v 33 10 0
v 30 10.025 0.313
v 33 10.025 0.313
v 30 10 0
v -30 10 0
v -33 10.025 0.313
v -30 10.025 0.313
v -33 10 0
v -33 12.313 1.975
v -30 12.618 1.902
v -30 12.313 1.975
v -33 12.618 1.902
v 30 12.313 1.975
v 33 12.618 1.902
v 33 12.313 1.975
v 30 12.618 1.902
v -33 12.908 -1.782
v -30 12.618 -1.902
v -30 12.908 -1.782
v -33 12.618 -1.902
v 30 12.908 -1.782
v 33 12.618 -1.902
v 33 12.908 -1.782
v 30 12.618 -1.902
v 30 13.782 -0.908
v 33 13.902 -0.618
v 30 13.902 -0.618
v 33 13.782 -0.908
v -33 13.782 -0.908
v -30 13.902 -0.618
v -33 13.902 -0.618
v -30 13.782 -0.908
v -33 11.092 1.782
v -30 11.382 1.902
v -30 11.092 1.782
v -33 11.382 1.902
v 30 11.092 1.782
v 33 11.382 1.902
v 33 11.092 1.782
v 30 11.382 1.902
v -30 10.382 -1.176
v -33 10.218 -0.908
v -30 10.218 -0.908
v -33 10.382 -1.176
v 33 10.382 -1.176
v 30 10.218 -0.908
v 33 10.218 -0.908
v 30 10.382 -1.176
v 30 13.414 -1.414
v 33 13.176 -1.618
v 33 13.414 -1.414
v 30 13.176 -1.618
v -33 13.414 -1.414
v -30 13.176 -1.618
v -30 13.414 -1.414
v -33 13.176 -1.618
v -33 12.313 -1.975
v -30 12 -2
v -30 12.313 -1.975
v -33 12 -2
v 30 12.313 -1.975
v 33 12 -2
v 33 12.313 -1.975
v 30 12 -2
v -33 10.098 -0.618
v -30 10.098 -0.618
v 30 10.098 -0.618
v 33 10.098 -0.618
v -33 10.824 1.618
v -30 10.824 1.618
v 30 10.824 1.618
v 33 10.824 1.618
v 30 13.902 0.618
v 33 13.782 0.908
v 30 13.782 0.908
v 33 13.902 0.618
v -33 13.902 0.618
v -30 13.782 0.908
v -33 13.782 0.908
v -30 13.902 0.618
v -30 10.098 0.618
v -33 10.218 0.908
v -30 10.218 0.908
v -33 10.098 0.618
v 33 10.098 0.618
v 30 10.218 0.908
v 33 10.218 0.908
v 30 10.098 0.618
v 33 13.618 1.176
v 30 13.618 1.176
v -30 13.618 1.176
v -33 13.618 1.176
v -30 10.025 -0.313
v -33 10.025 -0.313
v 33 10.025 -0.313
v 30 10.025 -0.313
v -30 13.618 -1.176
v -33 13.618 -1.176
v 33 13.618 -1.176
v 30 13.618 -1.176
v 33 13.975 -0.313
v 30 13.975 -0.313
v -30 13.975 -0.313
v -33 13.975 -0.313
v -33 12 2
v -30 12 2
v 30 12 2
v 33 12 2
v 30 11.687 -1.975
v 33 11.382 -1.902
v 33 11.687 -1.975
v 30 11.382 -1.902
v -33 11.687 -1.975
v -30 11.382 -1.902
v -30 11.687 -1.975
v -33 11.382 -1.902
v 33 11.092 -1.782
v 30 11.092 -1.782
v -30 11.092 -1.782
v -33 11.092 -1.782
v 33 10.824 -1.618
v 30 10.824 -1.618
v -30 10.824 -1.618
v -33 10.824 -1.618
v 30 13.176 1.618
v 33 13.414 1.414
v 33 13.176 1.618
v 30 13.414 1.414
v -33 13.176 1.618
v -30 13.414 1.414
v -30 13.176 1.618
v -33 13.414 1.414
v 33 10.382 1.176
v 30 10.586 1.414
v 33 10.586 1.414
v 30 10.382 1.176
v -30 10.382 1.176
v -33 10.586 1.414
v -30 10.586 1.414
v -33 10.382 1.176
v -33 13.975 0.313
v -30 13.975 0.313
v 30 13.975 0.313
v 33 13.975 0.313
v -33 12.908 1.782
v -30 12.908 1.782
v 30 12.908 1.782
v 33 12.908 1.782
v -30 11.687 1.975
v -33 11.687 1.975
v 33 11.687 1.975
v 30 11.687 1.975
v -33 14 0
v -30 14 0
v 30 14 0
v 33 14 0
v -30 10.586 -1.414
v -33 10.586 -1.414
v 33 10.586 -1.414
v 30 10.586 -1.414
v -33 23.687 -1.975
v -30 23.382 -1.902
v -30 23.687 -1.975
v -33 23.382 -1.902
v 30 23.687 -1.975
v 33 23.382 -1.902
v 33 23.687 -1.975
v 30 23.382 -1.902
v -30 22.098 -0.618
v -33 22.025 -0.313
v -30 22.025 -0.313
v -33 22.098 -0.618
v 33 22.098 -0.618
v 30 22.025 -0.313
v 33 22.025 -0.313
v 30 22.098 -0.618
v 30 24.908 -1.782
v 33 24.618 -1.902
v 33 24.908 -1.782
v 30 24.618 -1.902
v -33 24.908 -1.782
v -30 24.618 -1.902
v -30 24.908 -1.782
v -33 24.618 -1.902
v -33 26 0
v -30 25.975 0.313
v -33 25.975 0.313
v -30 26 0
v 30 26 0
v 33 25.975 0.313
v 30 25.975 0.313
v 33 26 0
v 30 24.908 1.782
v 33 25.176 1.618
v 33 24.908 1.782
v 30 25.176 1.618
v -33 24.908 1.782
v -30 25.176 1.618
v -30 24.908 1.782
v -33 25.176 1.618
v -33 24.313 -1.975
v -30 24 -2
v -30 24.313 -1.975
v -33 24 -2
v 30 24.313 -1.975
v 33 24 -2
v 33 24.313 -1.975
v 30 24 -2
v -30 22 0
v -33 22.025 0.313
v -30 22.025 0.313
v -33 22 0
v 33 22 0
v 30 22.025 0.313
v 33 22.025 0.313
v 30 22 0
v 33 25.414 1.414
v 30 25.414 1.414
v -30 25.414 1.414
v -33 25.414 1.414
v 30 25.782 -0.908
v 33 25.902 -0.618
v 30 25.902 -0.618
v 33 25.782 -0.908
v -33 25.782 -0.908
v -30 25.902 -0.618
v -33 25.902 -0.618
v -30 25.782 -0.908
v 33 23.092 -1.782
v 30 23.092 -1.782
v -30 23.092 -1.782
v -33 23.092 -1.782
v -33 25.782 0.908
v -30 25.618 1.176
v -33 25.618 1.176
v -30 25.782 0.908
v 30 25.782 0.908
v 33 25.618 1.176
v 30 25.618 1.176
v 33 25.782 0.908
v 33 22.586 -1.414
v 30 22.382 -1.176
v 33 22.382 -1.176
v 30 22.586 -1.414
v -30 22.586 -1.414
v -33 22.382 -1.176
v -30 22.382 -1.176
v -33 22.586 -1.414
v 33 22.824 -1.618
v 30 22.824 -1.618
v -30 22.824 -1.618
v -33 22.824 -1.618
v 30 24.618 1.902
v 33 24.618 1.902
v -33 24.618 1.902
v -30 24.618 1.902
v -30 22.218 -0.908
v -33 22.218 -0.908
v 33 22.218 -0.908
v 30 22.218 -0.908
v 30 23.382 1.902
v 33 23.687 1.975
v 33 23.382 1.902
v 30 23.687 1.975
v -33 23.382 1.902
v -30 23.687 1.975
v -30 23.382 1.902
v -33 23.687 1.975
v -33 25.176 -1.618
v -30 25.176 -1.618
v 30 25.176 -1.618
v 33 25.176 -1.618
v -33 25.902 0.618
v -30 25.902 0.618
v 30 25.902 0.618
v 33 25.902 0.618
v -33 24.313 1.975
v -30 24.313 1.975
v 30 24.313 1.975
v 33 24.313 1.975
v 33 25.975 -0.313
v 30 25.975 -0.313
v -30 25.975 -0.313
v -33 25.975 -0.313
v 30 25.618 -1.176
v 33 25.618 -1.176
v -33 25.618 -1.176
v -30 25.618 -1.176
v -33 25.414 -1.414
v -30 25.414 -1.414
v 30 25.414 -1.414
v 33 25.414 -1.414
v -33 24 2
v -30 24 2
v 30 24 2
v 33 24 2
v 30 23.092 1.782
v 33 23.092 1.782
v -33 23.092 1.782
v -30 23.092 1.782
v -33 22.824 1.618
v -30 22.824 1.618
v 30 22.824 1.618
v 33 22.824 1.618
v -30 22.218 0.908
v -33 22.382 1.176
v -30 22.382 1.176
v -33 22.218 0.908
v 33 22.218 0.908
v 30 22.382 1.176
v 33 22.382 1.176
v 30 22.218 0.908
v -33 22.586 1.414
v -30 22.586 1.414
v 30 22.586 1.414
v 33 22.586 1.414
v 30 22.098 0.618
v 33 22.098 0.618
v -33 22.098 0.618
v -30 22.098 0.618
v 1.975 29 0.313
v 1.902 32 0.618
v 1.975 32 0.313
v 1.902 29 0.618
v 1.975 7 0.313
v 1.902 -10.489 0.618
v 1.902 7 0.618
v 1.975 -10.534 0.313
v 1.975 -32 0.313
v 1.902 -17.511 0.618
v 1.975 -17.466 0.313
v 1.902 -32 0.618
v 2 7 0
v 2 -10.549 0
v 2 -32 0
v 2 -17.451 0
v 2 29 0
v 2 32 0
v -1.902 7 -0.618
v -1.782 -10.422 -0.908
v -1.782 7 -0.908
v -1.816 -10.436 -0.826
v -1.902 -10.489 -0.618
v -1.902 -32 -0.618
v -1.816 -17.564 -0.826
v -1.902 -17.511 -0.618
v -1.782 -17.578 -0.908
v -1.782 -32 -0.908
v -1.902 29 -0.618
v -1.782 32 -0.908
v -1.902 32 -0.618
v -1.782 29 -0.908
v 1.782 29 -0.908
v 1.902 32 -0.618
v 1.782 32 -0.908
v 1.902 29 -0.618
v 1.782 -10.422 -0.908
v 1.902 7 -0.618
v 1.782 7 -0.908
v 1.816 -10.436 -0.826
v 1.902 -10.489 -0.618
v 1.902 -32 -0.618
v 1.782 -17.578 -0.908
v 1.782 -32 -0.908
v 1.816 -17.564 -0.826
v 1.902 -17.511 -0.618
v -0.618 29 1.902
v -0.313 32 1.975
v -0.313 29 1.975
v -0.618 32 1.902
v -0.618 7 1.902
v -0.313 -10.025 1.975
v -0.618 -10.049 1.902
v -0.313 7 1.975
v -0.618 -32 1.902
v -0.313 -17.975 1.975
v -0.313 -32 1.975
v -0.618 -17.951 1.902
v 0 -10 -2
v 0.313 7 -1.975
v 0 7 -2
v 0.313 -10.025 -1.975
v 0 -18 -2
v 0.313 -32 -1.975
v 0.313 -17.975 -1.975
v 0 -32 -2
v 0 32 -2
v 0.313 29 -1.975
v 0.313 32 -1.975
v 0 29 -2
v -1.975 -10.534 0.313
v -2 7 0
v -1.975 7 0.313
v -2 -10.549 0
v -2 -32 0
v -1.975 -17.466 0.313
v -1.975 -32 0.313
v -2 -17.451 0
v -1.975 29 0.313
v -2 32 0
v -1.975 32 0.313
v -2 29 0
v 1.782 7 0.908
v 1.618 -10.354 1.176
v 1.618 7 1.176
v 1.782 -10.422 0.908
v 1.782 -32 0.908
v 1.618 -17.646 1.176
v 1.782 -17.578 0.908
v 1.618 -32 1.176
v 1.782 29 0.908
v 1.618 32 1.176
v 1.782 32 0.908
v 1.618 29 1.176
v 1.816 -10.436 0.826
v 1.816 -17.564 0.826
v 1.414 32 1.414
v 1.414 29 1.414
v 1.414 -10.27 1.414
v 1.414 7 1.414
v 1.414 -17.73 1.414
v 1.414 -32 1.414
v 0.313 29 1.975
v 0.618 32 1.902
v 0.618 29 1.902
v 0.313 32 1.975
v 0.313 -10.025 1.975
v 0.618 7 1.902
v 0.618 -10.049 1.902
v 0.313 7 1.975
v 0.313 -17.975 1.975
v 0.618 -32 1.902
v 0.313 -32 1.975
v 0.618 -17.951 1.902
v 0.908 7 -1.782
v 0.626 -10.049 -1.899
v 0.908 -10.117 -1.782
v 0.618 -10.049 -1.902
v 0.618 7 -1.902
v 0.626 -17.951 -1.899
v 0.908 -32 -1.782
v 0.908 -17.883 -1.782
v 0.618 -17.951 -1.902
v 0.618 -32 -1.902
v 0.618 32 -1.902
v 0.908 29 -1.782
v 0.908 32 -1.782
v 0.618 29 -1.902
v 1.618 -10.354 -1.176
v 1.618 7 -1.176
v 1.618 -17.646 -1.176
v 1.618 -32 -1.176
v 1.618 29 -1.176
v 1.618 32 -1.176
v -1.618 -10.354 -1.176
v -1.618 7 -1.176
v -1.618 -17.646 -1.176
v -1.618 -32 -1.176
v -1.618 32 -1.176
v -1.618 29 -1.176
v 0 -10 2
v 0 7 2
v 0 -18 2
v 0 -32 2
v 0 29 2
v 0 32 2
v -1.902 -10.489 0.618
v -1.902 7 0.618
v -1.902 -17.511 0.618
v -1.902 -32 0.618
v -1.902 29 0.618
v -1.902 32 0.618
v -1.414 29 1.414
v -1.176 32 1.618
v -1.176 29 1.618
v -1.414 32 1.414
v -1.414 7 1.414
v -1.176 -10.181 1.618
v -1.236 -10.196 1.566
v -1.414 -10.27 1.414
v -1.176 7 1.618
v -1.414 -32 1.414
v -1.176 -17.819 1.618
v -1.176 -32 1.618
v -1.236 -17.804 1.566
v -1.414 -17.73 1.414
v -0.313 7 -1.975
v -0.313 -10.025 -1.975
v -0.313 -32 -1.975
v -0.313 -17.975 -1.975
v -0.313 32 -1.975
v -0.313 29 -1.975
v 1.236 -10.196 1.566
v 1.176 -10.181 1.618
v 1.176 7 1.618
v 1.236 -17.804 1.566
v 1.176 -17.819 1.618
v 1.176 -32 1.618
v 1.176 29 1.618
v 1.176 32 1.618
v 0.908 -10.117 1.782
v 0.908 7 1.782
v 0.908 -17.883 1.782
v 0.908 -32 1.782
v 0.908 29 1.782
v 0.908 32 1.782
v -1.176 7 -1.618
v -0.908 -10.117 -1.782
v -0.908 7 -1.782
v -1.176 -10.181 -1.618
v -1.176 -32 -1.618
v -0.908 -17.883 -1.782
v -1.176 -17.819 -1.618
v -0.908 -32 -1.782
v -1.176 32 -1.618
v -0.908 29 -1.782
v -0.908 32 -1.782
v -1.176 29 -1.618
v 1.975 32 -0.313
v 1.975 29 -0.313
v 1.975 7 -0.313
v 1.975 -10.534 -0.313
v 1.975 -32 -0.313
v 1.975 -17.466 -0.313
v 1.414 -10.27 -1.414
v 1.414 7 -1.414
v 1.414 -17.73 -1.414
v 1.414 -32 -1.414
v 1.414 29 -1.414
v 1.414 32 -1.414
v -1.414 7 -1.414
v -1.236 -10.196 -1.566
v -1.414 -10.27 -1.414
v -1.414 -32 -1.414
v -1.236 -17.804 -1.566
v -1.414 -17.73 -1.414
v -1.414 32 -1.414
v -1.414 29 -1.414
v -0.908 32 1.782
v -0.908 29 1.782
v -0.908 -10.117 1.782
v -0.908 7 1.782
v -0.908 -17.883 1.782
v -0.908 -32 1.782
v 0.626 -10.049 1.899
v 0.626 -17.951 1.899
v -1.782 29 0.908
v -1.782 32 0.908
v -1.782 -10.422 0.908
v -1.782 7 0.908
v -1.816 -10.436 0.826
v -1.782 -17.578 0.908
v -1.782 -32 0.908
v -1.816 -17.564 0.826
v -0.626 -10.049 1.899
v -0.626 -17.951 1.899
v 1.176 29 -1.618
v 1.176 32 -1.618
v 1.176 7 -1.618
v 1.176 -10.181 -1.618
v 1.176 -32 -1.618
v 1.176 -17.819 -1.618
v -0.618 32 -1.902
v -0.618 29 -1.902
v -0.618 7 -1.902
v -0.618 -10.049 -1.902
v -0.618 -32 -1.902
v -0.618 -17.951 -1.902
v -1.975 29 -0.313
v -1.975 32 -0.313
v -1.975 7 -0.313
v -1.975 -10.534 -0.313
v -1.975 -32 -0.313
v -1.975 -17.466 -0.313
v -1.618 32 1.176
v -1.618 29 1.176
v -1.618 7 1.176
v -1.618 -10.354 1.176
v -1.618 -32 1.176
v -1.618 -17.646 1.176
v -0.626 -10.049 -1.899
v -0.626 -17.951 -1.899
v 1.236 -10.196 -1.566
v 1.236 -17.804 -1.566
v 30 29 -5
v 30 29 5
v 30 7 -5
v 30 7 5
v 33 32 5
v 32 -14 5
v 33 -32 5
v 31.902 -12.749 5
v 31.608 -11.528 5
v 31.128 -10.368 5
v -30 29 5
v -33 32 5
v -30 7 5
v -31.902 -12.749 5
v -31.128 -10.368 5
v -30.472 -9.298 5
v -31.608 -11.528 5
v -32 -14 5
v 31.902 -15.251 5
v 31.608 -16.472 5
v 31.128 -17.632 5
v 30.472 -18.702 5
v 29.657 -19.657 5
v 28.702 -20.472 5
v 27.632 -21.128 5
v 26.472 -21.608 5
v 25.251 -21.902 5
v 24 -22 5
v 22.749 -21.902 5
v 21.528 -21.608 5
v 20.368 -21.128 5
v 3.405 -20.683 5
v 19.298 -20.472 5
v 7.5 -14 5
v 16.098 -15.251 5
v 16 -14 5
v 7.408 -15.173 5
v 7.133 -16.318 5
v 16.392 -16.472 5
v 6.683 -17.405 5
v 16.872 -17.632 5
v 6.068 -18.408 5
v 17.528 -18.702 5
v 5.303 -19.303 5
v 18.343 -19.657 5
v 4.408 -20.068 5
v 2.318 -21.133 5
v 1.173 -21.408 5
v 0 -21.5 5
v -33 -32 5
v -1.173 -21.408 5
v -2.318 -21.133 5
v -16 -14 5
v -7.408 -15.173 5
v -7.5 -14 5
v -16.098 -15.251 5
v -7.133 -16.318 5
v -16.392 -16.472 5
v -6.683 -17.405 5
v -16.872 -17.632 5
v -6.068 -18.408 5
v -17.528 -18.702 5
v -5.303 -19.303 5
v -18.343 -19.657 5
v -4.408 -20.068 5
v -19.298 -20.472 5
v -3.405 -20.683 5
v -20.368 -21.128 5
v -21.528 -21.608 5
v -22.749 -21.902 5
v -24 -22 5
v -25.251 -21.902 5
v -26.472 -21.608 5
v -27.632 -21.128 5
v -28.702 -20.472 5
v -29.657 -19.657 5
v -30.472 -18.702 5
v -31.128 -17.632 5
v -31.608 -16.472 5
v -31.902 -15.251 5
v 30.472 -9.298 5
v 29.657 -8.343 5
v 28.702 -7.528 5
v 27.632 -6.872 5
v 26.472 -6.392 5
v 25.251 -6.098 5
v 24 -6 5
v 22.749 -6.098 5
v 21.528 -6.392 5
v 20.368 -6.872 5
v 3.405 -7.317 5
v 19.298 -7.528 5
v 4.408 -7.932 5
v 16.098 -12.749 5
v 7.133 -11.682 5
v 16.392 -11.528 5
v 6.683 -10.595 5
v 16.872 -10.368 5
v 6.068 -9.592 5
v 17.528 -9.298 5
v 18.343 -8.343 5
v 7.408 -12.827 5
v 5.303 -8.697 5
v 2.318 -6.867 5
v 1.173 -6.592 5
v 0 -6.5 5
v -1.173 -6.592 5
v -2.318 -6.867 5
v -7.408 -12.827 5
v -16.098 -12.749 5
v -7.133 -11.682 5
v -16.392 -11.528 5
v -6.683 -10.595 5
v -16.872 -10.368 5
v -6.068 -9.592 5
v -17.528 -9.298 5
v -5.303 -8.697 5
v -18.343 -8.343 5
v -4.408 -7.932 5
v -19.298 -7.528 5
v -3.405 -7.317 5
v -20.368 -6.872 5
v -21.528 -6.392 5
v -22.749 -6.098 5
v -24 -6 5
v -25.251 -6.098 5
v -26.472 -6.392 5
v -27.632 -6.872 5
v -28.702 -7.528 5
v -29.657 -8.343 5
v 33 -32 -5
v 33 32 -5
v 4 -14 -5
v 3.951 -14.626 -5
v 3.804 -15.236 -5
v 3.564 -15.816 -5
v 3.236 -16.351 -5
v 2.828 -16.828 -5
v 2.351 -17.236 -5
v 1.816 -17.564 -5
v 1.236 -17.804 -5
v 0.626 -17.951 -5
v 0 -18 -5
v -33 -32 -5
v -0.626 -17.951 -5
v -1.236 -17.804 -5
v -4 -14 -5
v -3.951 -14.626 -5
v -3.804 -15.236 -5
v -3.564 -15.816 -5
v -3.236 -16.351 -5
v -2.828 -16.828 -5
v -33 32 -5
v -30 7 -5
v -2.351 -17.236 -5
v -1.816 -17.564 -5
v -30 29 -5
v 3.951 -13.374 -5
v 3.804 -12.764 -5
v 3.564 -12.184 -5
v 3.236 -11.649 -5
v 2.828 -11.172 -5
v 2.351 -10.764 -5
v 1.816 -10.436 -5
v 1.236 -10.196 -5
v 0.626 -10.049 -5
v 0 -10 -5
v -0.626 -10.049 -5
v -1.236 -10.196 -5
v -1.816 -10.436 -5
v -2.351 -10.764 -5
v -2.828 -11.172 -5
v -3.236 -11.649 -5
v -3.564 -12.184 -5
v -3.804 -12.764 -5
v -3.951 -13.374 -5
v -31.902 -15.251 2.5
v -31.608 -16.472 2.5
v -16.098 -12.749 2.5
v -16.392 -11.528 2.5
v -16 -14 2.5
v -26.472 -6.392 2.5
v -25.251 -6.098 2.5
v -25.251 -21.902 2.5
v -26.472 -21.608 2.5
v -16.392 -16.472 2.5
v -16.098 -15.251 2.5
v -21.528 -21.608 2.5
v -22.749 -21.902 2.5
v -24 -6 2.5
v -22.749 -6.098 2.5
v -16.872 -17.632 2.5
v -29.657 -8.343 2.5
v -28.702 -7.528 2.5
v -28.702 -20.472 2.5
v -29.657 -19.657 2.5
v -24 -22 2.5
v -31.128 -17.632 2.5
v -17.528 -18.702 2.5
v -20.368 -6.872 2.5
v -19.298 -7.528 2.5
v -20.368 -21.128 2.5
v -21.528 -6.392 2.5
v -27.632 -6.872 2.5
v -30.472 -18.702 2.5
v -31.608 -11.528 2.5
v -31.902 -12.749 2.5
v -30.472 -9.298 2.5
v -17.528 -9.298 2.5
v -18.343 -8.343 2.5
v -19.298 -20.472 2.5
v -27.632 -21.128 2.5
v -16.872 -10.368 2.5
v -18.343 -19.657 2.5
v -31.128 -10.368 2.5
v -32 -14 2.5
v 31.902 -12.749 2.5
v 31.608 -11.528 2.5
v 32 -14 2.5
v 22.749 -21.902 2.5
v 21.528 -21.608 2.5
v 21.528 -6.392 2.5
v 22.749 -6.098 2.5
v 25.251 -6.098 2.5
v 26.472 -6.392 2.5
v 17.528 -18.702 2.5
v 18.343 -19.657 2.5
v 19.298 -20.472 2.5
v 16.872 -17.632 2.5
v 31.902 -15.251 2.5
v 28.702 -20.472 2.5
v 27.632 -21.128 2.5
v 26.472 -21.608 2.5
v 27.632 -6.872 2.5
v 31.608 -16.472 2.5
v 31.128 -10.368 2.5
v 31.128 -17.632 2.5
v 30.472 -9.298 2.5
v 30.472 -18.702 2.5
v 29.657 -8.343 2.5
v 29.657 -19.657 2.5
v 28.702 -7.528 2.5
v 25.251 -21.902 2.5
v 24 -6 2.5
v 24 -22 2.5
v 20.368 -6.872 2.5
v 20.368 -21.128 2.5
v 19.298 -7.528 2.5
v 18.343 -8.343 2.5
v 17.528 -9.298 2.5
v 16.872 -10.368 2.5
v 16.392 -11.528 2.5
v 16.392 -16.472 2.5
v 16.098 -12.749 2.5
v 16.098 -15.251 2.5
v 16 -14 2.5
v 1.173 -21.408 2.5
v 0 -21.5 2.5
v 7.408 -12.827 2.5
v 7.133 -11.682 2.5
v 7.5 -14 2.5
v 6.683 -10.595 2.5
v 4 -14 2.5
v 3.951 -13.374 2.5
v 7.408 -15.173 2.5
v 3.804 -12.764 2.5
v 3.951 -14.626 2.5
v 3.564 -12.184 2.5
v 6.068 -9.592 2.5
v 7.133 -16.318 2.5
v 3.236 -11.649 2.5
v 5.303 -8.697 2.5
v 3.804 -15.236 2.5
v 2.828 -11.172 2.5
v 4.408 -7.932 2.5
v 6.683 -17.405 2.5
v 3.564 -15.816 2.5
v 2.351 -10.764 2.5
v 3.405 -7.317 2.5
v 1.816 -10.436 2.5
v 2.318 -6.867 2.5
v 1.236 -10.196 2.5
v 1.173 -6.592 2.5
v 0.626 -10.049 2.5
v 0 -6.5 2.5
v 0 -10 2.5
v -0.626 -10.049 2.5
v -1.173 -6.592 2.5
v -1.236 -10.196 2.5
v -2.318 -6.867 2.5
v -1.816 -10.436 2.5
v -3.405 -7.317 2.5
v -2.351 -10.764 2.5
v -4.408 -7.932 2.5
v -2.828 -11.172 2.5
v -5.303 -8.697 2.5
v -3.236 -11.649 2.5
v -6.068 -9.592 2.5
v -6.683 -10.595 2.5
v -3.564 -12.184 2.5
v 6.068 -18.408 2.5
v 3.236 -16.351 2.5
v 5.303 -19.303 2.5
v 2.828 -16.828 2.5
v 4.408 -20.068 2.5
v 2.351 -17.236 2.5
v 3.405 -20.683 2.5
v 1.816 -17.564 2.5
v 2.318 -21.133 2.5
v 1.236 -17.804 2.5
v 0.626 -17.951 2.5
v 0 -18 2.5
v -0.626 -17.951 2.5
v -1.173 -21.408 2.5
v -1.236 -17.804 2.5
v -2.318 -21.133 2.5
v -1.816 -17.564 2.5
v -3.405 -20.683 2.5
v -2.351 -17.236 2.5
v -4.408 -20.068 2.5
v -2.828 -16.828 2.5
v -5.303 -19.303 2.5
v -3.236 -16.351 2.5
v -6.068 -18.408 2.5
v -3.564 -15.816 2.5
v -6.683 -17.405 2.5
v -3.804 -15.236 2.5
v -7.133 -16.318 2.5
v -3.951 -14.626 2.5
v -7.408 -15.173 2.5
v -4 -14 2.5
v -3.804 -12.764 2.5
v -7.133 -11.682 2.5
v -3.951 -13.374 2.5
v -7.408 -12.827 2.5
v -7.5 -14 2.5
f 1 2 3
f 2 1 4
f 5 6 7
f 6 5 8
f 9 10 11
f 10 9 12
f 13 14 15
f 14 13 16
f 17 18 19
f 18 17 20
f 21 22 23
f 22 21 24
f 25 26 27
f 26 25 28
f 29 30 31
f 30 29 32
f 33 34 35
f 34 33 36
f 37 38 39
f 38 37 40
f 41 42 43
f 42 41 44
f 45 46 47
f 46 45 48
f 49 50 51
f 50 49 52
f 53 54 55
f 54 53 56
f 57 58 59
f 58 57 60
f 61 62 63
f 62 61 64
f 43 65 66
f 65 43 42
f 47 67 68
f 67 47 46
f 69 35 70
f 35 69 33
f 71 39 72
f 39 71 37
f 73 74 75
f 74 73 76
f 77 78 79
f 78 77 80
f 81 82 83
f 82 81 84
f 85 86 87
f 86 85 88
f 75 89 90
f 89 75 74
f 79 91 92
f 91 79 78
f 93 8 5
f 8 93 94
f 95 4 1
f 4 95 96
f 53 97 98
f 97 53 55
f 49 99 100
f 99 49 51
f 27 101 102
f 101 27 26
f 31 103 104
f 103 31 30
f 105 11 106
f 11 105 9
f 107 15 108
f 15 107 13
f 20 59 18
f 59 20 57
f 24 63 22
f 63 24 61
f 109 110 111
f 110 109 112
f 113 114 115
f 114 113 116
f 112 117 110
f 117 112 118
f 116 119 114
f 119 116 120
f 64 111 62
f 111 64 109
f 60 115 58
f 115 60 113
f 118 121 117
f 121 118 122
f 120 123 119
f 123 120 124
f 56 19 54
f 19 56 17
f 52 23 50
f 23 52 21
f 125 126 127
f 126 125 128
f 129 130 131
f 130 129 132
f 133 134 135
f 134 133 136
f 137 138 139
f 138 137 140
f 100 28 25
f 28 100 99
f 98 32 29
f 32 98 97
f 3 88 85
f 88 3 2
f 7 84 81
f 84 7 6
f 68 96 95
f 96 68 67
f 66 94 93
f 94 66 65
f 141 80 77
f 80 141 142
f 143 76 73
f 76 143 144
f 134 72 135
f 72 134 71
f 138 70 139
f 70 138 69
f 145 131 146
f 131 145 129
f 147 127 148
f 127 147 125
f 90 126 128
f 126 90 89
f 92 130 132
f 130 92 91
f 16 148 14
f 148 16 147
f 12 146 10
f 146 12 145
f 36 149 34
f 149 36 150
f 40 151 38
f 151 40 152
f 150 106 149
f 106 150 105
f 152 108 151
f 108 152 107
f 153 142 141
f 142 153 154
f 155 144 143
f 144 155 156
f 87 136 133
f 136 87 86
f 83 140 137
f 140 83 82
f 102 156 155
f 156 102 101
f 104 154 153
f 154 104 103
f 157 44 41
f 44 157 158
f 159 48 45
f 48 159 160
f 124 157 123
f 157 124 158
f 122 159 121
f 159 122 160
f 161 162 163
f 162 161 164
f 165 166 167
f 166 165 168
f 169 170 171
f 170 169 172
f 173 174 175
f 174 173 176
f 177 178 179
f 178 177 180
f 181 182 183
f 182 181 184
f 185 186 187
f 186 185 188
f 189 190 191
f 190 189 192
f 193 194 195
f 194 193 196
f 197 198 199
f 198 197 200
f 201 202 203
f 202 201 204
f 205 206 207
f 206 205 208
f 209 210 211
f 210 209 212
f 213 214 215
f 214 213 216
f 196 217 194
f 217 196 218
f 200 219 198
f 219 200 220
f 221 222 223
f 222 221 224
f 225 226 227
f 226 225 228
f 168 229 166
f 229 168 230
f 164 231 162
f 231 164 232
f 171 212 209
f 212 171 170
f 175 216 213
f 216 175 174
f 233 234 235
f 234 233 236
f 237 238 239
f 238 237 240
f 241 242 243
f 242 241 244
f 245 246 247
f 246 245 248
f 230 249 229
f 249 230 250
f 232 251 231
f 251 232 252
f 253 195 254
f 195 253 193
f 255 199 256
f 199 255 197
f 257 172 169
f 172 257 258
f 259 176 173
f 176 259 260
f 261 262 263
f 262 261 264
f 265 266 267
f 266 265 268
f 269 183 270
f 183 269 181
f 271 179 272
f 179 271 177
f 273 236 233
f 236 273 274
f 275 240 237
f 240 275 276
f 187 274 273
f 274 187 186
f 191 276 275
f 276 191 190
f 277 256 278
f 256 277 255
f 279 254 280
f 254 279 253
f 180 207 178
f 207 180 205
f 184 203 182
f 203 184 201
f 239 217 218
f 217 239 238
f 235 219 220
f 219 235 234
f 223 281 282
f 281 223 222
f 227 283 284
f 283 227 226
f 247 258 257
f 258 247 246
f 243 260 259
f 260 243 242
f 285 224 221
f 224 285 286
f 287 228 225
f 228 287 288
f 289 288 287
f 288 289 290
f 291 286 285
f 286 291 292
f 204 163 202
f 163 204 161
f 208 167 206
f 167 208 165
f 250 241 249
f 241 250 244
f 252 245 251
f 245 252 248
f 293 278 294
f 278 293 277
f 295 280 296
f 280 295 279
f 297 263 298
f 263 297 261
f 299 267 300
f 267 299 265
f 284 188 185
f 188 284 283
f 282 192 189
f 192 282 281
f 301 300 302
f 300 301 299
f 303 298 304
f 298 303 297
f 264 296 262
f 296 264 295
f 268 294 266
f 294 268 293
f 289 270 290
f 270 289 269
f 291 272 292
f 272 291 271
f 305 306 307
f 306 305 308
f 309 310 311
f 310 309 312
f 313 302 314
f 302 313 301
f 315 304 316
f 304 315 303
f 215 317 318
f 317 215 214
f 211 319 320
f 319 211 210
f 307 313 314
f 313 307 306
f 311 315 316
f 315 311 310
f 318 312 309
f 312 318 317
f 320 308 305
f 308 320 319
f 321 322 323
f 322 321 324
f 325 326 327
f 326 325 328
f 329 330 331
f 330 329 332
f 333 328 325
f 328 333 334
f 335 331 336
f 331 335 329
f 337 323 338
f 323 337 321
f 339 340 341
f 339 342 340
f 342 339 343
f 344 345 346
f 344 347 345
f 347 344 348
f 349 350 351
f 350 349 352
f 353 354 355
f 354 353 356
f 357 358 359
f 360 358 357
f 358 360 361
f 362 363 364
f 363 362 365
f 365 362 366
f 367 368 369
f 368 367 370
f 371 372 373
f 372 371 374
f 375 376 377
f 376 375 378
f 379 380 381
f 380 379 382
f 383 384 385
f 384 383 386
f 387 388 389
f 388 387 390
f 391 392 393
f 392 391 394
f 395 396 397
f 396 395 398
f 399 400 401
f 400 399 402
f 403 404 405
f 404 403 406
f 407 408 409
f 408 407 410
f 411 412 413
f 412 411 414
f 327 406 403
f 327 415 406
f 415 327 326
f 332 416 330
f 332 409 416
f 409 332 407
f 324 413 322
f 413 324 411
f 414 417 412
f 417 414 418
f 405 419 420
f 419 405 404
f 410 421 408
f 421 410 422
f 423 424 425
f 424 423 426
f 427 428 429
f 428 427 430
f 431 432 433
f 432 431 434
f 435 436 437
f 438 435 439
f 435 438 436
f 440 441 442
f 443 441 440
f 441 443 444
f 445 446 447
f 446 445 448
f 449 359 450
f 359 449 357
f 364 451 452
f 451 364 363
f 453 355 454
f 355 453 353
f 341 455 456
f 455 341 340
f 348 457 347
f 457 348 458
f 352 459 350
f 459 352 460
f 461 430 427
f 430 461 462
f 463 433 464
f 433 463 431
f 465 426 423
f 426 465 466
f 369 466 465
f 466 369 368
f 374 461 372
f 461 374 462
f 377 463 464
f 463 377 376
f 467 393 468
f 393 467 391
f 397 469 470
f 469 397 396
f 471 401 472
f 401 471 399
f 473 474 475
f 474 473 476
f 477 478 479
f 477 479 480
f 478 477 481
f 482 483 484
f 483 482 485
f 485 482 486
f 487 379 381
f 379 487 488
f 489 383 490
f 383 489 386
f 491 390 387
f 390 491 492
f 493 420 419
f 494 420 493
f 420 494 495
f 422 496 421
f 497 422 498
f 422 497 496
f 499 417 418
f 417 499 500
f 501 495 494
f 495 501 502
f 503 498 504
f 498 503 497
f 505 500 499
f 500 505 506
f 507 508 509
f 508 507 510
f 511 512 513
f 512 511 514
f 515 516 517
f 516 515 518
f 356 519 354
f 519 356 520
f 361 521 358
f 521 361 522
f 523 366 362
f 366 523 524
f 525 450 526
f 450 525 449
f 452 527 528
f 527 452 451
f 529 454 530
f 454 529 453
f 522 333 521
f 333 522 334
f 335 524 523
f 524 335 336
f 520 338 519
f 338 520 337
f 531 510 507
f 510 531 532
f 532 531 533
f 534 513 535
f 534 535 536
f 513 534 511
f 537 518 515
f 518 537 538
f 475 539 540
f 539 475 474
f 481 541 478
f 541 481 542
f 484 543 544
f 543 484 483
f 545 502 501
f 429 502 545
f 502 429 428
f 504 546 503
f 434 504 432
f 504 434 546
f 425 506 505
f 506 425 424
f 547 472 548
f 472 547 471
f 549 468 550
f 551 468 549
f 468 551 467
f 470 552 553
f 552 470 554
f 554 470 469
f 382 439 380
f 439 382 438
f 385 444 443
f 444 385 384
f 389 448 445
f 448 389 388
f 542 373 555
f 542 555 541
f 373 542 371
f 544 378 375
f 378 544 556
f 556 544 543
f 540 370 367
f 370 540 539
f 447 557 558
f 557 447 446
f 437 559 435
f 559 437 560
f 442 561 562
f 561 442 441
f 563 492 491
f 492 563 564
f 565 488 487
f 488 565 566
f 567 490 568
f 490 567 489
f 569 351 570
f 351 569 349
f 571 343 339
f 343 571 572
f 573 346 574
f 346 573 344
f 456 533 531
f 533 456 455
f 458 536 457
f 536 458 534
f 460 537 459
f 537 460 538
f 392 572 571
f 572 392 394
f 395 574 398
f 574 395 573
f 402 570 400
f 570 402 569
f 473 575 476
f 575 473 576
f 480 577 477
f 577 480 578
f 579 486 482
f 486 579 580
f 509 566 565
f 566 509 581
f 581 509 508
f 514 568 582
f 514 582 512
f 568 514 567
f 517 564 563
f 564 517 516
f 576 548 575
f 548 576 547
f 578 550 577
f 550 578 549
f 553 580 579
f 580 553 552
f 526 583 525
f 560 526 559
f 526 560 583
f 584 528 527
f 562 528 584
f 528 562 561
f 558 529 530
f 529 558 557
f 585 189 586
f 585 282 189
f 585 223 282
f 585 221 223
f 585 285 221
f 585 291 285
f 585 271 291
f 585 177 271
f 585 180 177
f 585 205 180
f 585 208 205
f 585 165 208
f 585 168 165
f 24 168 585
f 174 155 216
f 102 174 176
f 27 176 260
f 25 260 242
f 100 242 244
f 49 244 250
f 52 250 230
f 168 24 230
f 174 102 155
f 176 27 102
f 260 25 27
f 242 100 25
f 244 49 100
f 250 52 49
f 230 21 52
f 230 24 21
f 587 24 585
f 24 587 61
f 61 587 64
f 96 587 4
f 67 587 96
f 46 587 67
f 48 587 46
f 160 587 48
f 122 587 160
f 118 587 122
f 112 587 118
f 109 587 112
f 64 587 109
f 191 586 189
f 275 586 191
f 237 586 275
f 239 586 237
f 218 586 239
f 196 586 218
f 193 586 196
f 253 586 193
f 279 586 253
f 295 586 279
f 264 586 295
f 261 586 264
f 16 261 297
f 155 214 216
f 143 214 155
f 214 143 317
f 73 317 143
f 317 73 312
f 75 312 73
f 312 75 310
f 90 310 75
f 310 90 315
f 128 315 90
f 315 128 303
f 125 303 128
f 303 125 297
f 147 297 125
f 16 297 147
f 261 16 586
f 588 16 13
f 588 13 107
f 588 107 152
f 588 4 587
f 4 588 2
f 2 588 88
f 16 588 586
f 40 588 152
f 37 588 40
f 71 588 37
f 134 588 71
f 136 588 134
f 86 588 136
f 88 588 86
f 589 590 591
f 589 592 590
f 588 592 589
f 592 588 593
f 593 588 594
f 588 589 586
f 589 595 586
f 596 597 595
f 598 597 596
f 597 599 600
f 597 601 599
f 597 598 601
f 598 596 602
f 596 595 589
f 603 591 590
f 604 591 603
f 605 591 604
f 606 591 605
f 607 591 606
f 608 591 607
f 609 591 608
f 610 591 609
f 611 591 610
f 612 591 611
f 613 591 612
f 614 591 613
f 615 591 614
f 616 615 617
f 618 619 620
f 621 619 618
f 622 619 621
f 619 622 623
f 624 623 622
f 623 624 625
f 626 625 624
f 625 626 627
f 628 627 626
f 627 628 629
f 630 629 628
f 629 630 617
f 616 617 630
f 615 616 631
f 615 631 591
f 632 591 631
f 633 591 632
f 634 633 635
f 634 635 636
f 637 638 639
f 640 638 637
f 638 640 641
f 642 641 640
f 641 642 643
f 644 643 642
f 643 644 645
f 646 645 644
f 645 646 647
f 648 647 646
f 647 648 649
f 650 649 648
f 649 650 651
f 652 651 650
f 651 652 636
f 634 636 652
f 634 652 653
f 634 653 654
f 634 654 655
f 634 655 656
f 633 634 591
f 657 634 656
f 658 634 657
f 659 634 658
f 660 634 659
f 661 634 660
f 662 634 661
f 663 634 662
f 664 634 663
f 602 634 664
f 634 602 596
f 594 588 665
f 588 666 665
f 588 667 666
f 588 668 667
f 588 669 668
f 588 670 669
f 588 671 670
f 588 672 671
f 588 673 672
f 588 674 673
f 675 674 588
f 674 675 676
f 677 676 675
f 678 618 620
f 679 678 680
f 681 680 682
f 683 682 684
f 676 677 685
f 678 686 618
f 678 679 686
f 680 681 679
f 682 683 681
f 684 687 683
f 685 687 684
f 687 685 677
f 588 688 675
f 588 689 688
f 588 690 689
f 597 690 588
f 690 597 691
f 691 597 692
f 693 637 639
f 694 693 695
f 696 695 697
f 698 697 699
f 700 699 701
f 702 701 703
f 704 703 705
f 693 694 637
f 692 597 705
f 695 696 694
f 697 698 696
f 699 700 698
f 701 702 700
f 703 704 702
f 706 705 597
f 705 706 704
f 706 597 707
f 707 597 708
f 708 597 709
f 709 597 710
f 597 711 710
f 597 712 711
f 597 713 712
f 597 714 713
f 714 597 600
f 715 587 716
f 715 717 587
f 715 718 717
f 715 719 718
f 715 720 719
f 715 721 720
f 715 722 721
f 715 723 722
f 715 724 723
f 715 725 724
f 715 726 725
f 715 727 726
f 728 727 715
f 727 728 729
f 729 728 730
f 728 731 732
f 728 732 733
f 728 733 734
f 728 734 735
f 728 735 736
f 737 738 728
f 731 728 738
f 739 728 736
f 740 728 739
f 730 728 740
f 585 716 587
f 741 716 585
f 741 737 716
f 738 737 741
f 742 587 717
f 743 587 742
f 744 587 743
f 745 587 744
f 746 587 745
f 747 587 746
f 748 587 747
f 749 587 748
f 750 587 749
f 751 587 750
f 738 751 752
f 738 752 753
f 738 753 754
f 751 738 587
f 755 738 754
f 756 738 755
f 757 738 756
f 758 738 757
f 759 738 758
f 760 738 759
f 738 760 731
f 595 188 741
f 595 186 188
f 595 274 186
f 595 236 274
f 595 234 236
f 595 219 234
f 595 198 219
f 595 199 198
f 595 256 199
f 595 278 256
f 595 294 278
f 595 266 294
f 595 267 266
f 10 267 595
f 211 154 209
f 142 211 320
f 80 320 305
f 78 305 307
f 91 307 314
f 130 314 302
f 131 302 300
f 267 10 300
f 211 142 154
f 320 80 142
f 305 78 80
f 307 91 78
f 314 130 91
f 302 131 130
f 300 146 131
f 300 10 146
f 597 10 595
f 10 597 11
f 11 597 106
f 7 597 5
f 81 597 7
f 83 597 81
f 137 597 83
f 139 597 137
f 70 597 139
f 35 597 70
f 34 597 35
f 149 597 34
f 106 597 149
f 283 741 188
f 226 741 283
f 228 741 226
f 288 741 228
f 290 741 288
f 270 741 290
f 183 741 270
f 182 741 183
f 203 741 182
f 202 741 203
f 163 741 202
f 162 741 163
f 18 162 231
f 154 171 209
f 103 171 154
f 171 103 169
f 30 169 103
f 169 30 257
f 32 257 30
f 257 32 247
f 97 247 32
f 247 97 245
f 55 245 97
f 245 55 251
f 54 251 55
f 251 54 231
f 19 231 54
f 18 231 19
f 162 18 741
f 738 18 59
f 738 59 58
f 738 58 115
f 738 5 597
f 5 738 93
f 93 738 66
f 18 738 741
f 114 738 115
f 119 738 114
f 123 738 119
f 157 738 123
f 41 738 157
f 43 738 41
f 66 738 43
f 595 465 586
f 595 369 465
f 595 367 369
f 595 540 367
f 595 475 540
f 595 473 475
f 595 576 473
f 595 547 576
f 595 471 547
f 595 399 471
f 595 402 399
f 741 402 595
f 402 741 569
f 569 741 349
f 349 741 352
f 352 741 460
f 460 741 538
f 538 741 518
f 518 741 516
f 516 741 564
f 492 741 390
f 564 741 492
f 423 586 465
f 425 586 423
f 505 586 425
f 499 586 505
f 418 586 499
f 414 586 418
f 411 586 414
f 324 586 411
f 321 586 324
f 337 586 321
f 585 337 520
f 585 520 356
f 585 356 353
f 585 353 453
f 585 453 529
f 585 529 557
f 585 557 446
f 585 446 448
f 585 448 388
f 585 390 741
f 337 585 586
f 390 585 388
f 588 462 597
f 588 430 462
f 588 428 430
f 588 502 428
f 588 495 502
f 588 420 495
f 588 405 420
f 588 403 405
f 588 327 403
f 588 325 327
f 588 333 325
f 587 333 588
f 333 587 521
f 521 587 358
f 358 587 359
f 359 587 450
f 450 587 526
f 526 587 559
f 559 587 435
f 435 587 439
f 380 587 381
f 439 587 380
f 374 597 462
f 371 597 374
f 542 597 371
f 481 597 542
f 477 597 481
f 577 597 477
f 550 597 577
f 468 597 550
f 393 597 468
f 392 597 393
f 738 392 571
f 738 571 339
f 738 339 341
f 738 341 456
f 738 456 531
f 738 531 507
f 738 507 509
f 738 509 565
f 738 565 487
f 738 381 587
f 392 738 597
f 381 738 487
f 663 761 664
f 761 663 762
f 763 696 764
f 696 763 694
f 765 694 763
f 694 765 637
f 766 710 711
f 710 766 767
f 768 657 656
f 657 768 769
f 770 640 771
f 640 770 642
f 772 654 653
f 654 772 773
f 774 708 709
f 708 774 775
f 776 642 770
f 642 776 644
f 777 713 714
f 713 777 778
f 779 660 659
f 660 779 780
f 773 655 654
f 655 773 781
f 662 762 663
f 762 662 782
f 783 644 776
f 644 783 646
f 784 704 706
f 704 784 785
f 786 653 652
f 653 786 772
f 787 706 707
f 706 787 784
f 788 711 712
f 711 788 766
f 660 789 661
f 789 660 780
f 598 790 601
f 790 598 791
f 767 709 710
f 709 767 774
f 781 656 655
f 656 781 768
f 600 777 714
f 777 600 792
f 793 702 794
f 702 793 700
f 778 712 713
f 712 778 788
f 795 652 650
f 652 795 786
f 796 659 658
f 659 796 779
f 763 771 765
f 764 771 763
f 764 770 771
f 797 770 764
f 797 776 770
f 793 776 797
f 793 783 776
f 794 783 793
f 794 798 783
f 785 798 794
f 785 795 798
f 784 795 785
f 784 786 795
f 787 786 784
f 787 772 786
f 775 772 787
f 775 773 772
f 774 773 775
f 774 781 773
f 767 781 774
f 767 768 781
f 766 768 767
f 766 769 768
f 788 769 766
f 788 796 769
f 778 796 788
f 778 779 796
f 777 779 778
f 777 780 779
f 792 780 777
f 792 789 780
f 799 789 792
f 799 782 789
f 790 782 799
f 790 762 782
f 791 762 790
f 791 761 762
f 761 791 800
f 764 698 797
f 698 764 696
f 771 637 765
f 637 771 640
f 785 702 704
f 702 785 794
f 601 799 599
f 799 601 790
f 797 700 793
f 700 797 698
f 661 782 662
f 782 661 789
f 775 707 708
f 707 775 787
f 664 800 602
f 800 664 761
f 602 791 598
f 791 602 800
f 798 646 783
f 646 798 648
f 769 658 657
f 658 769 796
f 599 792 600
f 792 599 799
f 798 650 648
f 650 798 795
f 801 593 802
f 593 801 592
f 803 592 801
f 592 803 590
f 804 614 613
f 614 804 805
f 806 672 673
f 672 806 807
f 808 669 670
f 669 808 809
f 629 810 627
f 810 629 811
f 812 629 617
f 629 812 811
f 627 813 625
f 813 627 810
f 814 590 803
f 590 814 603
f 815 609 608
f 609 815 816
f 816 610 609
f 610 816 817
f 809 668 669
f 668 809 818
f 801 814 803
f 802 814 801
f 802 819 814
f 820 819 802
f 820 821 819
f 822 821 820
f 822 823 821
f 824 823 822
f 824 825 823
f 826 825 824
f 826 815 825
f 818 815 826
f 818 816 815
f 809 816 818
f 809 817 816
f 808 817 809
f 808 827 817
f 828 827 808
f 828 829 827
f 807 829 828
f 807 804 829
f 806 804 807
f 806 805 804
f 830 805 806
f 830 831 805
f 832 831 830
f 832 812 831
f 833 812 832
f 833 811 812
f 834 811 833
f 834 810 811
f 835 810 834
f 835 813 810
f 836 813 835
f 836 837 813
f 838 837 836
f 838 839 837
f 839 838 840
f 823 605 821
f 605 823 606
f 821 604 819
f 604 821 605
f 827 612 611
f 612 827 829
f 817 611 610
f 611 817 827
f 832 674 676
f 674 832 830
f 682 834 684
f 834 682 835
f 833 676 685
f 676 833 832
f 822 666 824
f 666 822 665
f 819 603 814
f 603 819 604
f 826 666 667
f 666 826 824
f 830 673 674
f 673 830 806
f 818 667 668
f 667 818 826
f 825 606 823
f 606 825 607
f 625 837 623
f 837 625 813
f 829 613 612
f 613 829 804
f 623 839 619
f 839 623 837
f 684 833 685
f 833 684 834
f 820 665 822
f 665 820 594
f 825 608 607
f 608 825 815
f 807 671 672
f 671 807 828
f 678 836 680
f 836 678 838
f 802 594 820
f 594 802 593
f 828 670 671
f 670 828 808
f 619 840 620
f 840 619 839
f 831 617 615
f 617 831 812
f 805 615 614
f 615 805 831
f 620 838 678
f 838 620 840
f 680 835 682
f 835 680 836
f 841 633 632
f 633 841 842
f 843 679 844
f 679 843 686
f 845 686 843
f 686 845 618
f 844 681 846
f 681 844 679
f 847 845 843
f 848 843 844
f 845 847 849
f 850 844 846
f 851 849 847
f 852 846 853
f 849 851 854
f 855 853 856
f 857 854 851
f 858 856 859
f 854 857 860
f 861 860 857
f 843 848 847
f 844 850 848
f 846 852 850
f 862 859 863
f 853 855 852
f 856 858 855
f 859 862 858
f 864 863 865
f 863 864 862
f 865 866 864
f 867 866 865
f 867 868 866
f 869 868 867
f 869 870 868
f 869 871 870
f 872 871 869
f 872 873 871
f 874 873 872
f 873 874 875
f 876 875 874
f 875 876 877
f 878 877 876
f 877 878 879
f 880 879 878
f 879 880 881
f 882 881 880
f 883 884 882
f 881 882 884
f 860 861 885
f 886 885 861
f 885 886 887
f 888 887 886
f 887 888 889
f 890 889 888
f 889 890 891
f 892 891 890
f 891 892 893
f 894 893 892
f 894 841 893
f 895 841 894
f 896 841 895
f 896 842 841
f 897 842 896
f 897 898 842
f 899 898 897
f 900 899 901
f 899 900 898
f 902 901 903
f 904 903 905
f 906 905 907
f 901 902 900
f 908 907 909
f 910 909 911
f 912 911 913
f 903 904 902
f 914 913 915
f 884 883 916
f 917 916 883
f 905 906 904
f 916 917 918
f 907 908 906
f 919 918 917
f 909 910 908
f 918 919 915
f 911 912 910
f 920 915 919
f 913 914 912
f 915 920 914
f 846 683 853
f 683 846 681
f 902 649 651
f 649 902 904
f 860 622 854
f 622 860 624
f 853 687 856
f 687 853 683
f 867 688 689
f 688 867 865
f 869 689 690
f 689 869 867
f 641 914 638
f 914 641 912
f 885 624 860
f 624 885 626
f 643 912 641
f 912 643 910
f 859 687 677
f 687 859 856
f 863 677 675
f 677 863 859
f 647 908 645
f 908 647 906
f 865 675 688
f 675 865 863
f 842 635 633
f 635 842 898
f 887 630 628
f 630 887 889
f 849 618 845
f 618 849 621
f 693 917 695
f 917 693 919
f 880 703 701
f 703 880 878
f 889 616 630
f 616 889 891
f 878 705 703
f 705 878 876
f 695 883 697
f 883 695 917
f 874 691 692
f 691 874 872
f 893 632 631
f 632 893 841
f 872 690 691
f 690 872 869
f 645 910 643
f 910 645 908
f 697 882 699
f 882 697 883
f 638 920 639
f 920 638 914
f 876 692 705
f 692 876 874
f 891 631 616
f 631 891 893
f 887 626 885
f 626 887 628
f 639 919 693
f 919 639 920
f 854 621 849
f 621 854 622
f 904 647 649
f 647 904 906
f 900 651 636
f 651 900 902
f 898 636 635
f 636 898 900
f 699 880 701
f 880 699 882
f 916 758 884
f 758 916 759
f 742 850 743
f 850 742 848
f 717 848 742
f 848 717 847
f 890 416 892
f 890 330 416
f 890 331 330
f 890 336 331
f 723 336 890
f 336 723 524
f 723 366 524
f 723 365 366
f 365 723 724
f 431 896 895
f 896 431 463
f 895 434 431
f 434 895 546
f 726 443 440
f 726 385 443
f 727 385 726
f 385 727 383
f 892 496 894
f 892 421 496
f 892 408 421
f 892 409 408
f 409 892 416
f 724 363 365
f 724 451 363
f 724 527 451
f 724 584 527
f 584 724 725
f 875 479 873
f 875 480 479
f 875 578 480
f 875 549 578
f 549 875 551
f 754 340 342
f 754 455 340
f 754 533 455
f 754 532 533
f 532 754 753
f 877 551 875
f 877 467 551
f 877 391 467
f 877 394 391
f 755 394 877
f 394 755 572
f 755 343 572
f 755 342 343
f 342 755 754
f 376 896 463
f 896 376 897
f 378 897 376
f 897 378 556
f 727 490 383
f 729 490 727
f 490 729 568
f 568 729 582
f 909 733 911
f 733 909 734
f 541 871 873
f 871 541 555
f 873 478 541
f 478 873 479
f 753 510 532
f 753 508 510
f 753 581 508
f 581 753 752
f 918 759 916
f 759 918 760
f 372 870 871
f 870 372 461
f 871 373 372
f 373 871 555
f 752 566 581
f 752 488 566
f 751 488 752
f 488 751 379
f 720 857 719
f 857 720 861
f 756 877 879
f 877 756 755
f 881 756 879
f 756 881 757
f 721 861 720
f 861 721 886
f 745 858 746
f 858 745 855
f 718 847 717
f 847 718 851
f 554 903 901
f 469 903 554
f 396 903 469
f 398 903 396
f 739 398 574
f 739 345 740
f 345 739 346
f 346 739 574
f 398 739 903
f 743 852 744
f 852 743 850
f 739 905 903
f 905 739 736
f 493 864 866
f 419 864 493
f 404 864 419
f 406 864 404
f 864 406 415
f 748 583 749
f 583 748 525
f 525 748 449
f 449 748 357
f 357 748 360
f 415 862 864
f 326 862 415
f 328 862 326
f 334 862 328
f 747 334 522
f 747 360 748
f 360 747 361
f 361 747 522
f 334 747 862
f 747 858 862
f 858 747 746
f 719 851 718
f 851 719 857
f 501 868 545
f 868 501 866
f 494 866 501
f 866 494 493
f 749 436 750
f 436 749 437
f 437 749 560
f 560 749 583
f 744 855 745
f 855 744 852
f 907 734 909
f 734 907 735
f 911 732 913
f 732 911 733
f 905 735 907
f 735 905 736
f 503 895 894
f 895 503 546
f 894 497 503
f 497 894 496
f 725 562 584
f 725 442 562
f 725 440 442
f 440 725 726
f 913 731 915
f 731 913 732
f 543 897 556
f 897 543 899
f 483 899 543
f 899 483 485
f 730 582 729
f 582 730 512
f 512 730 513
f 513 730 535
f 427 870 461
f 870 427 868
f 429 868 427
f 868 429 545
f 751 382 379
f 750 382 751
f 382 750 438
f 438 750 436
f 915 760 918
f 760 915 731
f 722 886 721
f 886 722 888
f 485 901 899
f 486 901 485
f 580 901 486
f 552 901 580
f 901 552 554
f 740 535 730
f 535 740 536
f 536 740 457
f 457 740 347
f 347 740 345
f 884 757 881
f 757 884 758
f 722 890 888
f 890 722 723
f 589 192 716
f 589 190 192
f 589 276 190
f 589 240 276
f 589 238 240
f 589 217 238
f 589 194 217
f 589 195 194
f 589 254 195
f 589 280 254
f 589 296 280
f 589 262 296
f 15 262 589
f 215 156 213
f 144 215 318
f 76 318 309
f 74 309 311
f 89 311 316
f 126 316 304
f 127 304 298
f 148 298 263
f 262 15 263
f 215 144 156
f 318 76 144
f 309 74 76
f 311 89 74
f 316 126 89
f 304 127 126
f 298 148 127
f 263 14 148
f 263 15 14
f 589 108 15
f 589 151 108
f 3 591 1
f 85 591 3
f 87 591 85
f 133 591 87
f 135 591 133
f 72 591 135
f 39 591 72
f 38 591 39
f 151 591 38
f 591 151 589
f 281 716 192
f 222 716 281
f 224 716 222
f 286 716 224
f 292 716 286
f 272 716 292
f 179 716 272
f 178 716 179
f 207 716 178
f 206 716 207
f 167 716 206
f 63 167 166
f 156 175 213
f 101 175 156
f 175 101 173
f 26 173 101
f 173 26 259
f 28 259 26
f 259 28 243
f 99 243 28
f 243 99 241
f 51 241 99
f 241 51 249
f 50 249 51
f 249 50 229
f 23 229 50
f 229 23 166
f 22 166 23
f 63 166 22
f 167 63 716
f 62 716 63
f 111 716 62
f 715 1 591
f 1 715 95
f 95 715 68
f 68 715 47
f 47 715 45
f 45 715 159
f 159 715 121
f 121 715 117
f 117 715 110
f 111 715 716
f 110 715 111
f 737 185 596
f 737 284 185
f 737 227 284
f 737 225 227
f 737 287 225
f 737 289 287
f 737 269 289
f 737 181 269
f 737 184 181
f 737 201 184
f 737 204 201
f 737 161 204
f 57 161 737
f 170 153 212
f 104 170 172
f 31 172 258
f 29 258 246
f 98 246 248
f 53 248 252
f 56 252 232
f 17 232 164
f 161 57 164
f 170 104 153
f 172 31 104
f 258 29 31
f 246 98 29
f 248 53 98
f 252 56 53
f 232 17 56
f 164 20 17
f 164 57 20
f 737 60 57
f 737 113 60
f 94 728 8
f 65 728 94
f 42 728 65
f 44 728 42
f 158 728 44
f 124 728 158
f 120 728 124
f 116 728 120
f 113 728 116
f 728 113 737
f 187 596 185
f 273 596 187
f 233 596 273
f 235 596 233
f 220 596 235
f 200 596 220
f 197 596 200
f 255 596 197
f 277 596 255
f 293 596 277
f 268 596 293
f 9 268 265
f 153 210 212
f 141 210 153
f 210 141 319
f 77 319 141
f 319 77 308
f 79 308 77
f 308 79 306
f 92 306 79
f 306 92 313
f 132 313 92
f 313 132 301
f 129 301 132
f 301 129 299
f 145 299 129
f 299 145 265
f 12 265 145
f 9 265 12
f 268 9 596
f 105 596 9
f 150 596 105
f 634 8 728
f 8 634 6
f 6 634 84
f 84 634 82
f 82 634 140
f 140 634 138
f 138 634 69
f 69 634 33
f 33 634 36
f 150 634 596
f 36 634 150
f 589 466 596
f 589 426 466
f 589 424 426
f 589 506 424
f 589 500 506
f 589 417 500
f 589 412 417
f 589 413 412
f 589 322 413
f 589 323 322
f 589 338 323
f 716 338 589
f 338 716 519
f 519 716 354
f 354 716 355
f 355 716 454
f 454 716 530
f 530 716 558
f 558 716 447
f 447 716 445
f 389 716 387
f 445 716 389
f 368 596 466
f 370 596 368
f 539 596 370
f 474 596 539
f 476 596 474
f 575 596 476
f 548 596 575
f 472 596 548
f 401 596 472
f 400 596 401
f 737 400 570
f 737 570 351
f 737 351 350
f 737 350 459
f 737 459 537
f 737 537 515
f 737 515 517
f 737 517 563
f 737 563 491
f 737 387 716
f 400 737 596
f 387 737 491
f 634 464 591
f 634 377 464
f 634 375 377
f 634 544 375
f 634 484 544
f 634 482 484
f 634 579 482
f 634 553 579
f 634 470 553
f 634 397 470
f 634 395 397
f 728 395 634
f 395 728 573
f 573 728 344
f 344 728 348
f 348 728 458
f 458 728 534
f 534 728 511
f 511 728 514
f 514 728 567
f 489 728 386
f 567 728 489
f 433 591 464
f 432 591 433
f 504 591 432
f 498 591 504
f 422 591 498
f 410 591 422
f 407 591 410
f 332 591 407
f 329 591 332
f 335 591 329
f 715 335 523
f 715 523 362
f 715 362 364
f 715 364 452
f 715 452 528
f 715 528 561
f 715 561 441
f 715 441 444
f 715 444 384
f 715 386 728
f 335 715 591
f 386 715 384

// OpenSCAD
// file: gantry_base.scad
include <cnc_params.scad>

module mounting_holes() {
	for(ypos=[-1, 1]) {
		translate([0, ypos * (hole_d+2), 0]) {
			rotate([0, 90, 0]) {
				cylinder(d=hole_d, h=base_sz_x*2, center=true);
			}
		}
	}
	rotate([90, 0, 0]) {
		cylinder(d=hole_d, h=base_sz_x*2, center=true);
	}
}

module gantry_base() {

	difference() {

		cube([base_sz_x, base_sz_y, base_sz_z], center=true);

		// holes for top and bottom mounting
		for(zpos=[-1, 1]) {
			translate([0, 0, zpos*(base_sz_z/2-5)]) {
				mounting_holes();
			}
		}

		// holes for rod bearings
		for(zpos=rod_bearing_pos_z) {
			translate([0, 0, -base_sz_z/2+zpos]) {
				rotate([0, 90, 0]) {
					cylinder(d=rod_bearing_d, h=base_sz_x, center=true);
				}
			}
		}

		// holes for the screw lead
		translate([0, 0, -base_sz_z/2+lead_screw_nut_pos_z]) {
			rotate([0, 90, 0]) {
				cylinder(d=lead_screw_nut_d, h=base_sz_x, center=true);
				for(angle=[45:90:345]) {
					rotate([0, 0, angle]) {
						translate([lead_screw_nut_hole_r_dist, 0, 0]) {
							cylinder(d=lead_screw_nut_hole_d, h=base_sz_x, center=true);
						}
					}
				}
			}
		}
	}

}

rotate([0, 0, 45]) {
	gantry_base();
}
// file: cnc_params.scad
$fn = 40;

wall = 3;

rod_d = 12;
rod_bearing_d = 16; //?
rod_bearing_sz = 30; //?
rod_bearing_pos_z = [20, 50];
lead_screw_d = 8;
lead_screw_bearing_d = 15; //?
lead_screw_nut_d = 10; //?
lead_screw_nut_pos_z = 35; //?
lead_screw_nut_hole_d = 2.4; //?
lead_screw_nut_hole_r_dist = 4;

base_sz_x = rod_bearing_sz * 2;
base_sz_y = rod_bearing_d + 6; // shortest
base_sz_z = rod_bearing_pos_z[1] + rod_bearing_d;
hole_d = 4;

motor_sz = 30; //?
motor_d = 15;
motor_hole_dist = 24; //?

top_block_sz_x = base_sz_x + 2 * wall;
top_block_sz_y = motor_sz + 4 * wall + base_sz_y;
top_block_sz_z = 10;

bottom_block_sz_x = top_block_sz_x;
bottom_block_sz_y = top_block_sz_y;
bottom_block_sz_z = 10;
// main file
include <cnc_params.scad>
use <gantry_base.scad>

module bottom_side() {
	difference() {
		cube([bottom_block_sz_x, bottom_block_sz_y, bottom_block_sz_z], center=true);
		translate([0, (bottom_block_sz_y-base_sz_y)/2-wall, 0]) {
			cube([base_sz_x, base_sz_y, bottom_block_sz_z], center=true);
			mounting_holes();
		}
		translate([0, -(bottom_block_sz_y-motor_sz)/2+wall, bottom_block_sz_z/4]) {
			// motor hole
			translate([0, 0, bottom_block_sz_z/2]) {
				cylinder(d=lead_screw_bearing_d, h=bottom_block_sz_z, center=true);
			}
			cylinder(d=lead_screw_d, h=bottom_block_sz_z*4, center=true);
			for(xpos=[-1,1]) {
				// rod holes
				translate([xpos*(motor_sz/2+(bottom_block_sz_x-motor_sz)/4), 0, bottom_block_sz_z/2]) {
					cylinder(d=rod_bearing_d, h=bottom_block_sz_z, center=true);
				}
			}
		}
	}
}

bottom_side();
